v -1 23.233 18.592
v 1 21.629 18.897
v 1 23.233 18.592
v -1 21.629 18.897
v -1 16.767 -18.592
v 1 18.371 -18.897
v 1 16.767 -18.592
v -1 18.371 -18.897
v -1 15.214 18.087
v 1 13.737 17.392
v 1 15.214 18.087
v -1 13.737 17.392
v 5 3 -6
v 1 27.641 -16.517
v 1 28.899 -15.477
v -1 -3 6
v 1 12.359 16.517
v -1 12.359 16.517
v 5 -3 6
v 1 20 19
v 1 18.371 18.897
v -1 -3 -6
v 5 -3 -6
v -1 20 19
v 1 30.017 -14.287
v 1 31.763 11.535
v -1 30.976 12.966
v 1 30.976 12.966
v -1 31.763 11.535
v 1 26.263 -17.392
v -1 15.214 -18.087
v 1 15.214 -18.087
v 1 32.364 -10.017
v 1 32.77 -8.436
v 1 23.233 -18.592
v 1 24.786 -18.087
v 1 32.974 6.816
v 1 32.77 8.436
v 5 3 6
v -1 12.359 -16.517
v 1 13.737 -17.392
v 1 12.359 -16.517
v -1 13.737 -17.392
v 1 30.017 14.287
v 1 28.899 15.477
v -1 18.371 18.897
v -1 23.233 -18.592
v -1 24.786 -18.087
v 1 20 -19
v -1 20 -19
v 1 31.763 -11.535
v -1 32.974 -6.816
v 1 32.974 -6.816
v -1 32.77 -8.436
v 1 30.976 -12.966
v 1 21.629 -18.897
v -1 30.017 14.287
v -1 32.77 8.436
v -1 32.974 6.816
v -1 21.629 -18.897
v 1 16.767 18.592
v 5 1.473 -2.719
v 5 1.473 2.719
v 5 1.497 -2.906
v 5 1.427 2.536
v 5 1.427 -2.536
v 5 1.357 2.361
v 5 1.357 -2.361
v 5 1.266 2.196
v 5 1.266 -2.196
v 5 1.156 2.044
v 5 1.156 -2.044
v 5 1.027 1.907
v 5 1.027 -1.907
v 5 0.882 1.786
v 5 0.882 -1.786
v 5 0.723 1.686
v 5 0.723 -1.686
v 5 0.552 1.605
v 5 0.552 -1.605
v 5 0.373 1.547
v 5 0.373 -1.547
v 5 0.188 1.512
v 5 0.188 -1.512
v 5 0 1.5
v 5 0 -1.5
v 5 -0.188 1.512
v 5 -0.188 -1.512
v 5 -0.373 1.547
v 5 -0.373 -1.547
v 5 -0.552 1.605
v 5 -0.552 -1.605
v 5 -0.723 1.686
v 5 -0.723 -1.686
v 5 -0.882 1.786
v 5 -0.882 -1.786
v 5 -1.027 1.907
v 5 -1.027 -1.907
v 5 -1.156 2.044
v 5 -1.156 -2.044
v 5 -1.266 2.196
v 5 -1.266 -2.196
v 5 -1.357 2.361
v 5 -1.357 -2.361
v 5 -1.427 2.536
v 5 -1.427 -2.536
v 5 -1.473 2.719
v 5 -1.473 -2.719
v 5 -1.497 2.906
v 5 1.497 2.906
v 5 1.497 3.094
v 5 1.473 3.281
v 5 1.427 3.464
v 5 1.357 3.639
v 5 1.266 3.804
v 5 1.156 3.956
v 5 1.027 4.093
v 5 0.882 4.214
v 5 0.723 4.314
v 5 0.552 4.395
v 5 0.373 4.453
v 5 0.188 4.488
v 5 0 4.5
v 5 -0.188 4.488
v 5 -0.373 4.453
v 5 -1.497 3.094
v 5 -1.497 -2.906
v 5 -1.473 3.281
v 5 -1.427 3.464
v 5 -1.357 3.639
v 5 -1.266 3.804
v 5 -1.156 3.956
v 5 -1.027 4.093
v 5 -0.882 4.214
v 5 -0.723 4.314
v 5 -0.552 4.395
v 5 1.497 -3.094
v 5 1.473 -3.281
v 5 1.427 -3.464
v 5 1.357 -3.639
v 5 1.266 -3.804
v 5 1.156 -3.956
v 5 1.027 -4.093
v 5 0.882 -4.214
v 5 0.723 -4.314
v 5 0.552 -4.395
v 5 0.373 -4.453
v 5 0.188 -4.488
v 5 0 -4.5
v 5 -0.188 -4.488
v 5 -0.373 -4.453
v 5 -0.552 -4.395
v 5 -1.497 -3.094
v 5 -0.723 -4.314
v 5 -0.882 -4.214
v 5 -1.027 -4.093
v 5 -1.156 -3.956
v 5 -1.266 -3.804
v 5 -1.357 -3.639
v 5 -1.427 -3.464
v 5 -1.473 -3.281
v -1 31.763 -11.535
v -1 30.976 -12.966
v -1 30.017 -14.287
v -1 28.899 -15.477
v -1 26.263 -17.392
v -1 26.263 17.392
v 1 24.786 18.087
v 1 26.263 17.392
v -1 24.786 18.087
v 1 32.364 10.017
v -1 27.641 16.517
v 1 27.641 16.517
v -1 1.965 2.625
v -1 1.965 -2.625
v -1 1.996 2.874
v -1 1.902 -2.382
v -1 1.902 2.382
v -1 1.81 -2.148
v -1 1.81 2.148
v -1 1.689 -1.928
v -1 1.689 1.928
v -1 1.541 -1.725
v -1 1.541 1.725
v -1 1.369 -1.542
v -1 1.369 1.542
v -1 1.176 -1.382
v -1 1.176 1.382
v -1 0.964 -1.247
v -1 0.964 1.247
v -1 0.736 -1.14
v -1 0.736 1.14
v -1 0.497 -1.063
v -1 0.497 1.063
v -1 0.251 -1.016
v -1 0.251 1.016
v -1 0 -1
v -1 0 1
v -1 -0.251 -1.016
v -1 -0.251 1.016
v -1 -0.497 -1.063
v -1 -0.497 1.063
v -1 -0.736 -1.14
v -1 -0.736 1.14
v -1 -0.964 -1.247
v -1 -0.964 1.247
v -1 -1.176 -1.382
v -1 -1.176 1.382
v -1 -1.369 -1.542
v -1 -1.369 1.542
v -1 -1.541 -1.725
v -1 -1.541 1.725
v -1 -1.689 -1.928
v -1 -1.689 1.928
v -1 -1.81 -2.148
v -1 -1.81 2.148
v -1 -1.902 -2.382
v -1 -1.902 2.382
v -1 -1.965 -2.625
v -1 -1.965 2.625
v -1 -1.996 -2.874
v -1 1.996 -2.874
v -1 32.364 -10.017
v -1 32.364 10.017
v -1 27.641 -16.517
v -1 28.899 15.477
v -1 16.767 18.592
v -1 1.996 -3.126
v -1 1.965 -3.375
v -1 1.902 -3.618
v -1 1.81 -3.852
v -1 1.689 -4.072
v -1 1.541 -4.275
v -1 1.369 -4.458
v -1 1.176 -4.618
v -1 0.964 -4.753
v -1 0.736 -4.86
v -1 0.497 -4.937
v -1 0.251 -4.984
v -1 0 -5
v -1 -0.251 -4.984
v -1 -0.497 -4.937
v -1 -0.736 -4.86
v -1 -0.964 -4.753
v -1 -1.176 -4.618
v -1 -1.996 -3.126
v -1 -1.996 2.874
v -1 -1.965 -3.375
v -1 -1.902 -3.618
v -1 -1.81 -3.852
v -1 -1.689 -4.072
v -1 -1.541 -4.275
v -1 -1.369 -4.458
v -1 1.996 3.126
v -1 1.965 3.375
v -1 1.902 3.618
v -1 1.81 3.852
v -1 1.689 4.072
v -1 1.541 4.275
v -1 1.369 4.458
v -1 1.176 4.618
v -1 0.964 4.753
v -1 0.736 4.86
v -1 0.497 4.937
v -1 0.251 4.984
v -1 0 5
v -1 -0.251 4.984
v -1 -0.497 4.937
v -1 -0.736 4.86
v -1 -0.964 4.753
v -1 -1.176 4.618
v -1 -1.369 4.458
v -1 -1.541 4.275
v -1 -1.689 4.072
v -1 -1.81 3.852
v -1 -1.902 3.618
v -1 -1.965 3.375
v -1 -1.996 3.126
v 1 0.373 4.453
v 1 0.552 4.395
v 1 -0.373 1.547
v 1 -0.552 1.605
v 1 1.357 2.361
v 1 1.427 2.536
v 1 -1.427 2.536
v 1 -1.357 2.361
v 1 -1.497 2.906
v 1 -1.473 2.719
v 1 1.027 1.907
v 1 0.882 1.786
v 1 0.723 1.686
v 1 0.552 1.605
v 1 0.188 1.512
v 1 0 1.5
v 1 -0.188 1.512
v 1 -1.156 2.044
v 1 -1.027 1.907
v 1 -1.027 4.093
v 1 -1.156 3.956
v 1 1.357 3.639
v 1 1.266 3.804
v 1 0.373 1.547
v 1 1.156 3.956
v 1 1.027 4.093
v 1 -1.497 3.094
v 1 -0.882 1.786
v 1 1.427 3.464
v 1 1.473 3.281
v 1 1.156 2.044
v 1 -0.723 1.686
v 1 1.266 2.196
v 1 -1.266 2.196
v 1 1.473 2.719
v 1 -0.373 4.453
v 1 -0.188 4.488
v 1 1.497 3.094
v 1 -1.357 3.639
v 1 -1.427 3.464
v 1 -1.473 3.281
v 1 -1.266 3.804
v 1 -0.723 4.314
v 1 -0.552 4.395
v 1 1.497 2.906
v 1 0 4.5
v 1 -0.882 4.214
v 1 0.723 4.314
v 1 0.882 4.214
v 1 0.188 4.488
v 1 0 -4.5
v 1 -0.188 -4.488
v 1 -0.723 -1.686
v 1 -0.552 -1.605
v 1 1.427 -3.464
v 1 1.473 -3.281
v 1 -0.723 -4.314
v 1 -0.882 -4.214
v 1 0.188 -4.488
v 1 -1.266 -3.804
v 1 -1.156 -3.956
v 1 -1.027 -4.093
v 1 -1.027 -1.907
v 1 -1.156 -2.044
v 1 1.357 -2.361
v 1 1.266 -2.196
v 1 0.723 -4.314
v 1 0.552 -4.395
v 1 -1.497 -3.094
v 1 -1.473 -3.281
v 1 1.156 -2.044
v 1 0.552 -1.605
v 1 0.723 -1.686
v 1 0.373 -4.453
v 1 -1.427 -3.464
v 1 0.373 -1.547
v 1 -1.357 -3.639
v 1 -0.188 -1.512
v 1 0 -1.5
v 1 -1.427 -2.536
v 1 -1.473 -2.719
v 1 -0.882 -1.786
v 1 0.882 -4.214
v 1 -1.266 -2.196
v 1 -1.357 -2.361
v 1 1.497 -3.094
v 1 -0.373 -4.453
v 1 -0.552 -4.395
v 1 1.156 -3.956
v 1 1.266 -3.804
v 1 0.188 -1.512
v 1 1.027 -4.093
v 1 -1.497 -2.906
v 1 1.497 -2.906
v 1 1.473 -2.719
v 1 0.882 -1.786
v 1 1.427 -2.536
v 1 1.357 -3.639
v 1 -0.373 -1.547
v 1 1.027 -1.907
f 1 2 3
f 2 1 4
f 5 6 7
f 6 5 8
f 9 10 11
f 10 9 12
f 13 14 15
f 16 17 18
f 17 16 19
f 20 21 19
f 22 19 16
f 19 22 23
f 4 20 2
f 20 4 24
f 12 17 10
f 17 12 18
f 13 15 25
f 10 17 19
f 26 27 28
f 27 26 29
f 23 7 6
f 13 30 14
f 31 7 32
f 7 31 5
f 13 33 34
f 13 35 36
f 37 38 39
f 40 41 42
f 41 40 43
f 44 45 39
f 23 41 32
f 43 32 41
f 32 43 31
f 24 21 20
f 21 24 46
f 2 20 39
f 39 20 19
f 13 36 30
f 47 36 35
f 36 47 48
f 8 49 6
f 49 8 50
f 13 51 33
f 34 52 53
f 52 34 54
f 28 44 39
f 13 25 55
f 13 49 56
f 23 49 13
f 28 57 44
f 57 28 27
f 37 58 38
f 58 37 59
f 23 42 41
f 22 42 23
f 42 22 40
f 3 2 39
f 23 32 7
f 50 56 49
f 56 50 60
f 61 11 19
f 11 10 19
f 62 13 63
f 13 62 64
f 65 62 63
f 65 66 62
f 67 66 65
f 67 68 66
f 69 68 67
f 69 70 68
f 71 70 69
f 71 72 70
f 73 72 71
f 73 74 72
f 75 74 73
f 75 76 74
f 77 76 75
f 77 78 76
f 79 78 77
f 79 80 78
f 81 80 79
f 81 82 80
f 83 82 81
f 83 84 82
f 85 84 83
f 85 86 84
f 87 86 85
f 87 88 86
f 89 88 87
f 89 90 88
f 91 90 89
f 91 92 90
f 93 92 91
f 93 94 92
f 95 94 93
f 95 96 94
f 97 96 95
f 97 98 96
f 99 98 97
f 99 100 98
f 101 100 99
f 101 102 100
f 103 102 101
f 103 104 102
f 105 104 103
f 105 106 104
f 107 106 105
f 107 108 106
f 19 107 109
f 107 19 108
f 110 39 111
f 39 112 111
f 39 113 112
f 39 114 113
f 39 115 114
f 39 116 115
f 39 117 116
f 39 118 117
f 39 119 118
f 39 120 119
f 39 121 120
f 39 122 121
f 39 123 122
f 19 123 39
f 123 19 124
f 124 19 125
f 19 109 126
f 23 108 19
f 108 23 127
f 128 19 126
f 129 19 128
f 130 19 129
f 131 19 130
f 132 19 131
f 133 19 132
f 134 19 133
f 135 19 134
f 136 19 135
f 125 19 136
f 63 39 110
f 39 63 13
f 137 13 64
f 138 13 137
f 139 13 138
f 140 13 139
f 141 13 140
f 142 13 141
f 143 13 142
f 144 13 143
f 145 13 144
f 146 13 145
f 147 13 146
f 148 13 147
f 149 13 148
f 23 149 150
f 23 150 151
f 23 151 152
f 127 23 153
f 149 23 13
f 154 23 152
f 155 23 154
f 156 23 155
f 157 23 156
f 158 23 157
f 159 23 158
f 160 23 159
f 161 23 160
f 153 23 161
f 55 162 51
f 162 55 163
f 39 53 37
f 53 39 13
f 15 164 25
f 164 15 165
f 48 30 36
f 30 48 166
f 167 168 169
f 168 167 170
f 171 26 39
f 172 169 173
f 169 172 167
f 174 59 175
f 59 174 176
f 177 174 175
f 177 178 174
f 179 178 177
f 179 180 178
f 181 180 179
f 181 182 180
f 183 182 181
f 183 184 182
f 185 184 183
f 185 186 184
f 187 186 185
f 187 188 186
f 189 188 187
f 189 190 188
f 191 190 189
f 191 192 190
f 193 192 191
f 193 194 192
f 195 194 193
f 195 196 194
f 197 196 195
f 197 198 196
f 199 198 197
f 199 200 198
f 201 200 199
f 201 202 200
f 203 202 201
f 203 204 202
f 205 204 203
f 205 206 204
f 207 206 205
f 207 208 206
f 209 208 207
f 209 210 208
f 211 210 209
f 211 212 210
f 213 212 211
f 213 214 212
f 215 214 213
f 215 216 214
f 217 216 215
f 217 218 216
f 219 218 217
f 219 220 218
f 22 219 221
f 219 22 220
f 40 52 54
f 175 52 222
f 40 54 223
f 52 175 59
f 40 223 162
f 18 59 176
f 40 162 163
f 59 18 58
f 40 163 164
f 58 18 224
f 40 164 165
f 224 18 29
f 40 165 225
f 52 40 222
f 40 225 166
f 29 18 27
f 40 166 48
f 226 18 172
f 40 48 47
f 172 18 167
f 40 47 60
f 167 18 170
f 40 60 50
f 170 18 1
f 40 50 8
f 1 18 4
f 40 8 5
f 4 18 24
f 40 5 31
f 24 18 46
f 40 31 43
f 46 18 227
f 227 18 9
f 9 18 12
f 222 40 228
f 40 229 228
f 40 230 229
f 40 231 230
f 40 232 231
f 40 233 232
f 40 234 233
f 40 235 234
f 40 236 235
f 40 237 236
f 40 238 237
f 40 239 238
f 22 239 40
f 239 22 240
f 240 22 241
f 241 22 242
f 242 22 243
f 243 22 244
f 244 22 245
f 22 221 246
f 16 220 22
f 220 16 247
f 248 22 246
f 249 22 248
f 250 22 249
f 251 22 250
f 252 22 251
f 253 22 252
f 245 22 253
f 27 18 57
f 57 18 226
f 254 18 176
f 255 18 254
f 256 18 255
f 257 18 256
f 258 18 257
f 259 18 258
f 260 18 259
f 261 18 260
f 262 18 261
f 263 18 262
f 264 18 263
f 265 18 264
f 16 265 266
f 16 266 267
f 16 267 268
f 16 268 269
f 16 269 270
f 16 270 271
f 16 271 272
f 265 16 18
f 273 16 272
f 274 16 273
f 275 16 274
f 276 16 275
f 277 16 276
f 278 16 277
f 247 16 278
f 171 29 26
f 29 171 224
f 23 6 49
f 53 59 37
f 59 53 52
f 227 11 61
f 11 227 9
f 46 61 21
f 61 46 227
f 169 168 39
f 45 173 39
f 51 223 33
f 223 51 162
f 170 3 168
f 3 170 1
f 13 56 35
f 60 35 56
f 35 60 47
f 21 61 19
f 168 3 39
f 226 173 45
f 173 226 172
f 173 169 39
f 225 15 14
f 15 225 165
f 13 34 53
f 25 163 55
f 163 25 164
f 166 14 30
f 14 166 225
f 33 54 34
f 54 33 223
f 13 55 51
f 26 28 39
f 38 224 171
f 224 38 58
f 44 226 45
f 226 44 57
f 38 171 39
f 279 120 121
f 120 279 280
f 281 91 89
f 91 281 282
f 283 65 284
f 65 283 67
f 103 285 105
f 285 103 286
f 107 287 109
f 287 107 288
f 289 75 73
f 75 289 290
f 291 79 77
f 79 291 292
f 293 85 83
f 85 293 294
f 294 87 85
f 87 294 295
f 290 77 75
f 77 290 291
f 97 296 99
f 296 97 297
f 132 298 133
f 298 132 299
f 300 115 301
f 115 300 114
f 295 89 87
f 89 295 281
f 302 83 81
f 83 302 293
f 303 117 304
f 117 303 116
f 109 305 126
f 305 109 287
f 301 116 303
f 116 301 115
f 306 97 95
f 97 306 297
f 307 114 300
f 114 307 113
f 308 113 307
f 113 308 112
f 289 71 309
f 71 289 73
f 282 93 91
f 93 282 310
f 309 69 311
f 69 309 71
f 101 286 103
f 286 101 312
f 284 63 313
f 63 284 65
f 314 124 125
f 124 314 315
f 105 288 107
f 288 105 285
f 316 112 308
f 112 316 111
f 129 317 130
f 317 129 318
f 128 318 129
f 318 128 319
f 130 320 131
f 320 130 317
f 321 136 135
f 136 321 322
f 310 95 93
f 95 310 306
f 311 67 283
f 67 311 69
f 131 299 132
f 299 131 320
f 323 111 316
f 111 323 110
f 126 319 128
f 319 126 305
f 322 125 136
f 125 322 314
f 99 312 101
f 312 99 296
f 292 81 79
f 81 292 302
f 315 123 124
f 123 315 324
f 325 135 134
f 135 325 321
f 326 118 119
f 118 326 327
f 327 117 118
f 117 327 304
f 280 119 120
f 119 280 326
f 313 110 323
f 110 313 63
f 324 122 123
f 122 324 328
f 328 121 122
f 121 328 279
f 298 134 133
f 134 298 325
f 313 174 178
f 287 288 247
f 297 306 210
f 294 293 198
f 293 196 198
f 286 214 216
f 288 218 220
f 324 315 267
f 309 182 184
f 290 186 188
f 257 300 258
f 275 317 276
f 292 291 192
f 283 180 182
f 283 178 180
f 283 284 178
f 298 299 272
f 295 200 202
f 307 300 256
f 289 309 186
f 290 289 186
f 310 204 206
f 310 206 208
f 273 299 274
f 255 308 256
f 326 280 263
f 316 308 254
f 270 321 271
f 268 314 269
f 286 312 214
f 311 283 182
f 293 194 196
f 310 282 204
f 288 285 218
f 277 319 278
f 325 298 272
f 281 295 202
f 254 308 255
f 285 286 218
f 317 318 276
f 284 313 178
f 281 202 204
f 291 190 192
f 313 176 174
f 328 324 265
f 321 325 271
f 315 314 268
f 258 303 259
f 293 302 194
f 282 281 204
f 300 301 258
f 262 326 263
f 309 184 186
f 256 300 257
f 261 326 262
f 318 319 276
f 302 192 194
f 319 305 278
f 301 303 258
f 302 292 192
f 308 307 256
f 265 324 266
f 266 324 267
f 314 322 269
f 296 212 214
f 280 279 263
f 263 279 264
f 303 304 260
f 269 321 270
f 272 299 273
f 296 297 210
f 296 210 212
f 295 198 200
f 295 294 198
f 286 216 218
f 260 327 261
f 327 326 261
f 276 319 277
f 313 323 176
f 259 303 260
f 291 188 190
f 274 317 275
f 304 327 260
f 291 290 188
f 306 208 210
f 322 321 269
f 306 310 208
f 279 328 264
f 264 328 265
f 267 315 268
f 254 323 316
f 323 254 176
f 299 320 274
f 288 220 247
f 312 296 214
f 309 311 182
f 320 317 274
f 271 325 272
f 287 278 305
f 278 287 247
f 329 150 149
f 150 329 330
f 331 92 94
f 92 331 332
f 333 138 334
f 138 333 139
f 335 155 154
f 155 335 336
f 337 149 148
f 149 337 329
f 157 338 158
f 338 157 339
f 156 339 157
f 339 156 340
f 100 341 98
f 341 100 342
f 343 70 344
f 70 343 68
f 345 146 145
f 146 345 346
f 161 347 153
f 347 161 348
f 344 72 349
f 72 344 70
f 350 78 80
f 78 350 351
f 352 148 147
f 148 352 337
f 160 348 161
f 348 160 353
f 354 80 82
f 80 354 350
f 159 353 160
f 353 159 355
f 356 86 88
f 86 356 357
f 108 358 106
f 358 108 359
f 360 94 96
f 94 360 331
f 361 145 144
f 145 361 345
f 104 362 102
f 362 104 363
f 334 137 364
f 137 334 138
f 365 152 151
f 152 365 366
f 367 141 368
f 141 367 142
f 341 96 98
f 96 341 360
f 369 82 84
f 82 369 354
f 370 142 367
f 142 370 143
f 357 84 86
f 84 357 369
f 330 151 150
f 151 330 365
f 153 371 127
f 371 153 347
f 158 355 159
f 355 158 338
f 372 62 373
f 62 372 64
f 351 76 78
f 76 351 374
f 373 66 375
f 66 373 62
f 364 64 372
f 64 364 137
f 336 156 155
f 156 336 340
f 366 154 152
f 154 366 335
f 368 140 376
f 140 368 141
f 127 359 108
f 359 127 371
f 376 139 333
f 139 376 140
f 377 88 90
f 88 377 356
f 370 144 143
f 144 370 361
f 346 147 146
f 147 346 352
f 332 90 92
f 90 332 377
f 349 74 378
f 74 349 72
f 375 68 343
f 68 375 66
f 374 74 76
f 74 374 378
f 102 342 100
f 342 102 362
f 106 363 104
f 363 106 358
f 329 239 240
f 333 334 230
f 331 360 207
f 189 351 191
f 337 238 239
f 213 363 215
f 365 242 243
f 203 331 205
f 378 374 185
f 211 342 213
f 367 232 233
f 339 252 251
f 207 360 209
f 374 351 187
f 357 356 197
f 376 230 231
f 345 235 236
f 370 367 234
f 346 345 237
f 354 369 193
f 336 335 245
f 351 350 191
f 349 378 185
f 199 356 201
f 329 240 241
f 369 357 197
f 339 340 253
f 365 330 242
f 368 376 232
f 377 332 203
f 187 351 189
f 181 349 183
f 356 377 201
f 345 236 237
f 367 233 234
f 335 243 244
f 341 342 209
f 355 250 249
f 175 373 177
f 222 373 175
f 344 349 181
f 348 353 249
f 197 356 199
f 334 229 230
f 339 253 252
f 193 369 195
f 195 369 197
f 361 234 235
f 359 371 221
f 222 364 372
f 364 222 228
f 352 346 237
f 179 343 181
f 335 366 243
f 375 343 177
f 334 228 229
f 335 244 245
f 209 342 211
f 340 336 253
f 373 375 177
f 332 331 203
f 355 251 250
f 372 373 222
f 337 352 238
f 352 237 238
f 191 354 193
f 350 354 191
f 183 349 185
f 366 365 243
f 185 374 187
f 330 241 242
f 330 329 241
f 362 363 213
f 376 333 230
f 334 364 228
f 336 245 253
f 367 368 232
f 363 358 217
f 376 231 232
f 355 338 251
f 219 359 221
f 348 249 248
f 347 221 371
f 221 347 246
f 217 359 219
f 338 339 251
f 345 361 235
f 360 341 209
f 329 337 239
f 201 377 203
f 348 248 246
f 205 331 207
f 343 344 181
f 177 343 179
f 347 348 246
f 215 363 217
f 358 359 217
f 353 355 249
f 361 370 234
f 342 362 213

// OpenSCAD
difference(){
//otwor pod srube    


hull(){
translate([2,0,0]){
cube([6,6,12],true);    
    }     

    
translate([0,20,6]){
rotate([0,90,0]){
cylinder(2,13,13,$fn=50,true);
}
}

translate([0,20,-6]){
rotate([0,90,0]){
cylinder(2,13,13,$fn=50,true);
}
}

}

translate([2,0,3]){
rotate([0,90,0]){
cylinder(6,1.5,1.5,$fn=50,true);
}
}

translate([0,0,3]){
rotate([0,90,0]){
cylinder(2,2,1.5,$fn=50,true);
}
}

translate([2,0,-3]){
rotate([0,90,0]){
cylinder(6,1.5,1.5,$fn=50,true);
}
}
translate([0,0,-3]){
rotate([0,90,0]){
cylinder(2,2,1.5,$fn=50,true);
}
}
}
